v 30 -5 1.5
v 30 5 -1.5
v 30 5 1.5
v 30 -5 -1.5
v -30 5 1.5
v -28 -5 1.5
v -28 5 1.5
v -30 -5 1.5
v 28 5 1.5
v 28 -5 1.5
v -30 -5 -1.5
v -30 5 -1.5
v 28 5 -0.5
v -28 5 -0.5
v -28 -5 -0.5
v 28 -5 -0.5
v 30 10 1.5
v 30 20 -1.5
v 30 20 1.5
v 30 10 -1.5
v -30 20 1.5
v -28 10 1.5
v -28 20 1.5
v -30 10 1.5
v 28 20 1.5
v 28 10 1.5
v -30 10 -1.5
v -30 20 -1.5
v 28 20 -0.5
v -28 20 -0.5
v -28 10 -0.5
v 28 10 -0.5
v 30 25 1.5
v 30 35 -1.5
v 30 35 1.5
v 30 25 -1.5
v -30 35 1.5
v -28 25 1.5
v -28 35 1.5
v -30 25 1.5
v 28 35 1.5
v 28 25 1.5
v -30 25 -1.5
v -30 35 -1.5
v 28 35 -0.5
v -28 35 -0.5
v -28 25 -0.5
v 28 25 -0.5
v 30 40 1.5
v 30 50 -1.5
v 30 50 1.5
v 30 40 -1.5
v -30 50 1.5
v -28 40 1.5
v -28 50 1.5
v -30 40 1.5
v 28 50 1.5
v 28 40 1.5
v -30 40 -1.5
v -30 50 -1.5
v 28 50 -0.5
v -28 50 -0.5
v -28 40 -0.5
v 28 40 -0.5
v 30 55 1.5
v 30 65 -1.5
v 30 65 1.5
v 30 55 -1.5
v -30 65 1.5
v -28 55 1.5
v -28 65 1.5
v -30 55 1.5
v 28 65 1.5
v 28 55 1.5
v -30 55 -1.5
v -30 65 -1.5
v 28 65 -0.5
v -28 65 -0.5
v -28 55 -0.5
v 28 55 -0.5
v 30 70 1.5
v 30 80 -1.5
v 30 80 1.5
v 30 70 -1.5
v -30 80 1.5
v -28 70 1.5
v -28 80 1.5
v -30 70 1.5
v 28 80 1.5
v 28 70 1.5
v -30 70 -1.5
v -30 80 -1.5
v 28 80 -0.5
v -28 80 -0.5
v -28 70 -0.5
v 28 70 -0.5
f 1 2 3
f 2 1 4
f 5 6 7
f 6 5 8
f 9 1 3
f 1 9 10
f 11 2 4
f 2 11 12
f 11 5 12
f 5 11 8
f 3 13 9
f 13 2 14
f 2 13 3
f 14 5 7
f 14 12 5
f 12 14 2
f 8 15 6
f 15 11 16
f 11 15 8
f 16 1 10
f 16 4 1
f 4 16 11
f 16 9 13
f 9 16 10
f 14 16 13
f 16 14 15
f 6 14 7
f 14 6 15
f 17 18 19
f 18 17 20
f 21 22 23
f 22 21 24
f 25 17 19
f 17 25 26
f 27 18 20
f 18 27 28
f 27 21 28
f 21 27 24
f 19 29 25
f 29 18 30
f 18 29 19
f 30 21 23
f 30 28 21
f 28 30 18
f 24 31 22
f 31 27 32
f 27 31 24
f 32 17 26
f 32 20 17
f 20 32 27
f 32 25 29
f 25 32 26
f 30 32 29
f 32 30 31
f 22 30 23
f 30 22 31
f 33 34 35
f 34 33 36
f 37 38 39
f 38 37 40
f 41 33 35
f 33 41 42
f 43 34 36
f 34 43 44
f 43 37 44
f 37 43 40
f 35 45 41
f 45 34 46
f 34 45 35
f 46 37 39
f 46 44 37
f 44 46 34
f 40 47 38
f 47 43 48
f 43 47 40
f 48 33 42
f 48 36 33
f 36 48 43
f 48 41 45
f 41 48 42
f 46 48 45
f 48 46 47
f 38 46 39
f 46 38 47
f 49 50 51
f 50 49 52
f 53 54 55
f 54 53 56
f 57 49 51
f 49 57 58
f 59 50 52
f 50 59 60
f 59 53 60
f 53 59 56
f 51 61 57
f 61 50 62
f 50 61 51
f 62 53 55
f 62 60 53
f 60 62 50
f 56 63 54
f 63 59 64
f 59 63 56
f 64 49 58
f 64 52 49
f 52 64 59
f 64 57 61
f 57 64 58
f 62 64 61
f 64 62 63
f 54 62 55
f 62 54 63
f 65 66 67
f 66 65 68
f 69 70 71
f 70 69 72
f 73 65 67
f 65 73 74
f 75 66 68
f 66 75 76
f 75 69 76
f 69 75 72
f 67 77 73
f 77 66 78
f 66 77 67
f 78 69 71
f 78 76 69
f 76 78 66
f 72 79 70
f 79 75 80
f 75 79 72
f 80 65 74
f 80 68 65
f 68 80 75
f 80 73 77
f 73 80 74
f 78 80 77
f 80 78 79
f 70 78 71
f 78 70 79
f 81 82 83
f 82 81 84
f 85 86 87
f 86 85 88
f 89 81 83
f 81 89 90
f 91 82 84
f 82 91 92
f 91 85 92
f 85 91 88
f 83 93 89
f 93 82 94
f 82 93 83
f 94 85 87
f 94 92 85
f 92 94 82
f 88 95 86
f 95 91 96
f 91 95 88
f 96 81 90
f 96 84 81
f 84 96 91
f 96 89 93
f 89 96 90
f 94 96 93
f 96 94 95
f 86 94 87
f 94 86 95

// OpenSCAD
// file: constants.scad
//panel dimensions
pwidth = 60;
pheight = 100;

//side dimensions
swidth = 50;
sheight = pheight + 40;
sidepannel_margin = 1;

thickness1 = 2;
thickness2 = 3;
grovedepth = 2;

mfold = 5;
fit = 0.1;
grove_width = thickness2 + fit;
lamella_length = 10;

$fn = 100;
// main file
include <constants.scad>

module lamella(){
    difference(){
	cube([pwidth, lamella_length, thickness2], center=true);
	translate([0,0,thickness2-thickness1])
	    cube([pwidth-2*thickness1, lamella_length+mfold, thickness2], center=true);
    }
}

module lamellas(num_lamellas){
    for(i = [0:num_lamellas-1] ) {
	translate([0, i*(lamella_length+5), 0]) 
	    lamella();
    }
}

lamellas(6);
